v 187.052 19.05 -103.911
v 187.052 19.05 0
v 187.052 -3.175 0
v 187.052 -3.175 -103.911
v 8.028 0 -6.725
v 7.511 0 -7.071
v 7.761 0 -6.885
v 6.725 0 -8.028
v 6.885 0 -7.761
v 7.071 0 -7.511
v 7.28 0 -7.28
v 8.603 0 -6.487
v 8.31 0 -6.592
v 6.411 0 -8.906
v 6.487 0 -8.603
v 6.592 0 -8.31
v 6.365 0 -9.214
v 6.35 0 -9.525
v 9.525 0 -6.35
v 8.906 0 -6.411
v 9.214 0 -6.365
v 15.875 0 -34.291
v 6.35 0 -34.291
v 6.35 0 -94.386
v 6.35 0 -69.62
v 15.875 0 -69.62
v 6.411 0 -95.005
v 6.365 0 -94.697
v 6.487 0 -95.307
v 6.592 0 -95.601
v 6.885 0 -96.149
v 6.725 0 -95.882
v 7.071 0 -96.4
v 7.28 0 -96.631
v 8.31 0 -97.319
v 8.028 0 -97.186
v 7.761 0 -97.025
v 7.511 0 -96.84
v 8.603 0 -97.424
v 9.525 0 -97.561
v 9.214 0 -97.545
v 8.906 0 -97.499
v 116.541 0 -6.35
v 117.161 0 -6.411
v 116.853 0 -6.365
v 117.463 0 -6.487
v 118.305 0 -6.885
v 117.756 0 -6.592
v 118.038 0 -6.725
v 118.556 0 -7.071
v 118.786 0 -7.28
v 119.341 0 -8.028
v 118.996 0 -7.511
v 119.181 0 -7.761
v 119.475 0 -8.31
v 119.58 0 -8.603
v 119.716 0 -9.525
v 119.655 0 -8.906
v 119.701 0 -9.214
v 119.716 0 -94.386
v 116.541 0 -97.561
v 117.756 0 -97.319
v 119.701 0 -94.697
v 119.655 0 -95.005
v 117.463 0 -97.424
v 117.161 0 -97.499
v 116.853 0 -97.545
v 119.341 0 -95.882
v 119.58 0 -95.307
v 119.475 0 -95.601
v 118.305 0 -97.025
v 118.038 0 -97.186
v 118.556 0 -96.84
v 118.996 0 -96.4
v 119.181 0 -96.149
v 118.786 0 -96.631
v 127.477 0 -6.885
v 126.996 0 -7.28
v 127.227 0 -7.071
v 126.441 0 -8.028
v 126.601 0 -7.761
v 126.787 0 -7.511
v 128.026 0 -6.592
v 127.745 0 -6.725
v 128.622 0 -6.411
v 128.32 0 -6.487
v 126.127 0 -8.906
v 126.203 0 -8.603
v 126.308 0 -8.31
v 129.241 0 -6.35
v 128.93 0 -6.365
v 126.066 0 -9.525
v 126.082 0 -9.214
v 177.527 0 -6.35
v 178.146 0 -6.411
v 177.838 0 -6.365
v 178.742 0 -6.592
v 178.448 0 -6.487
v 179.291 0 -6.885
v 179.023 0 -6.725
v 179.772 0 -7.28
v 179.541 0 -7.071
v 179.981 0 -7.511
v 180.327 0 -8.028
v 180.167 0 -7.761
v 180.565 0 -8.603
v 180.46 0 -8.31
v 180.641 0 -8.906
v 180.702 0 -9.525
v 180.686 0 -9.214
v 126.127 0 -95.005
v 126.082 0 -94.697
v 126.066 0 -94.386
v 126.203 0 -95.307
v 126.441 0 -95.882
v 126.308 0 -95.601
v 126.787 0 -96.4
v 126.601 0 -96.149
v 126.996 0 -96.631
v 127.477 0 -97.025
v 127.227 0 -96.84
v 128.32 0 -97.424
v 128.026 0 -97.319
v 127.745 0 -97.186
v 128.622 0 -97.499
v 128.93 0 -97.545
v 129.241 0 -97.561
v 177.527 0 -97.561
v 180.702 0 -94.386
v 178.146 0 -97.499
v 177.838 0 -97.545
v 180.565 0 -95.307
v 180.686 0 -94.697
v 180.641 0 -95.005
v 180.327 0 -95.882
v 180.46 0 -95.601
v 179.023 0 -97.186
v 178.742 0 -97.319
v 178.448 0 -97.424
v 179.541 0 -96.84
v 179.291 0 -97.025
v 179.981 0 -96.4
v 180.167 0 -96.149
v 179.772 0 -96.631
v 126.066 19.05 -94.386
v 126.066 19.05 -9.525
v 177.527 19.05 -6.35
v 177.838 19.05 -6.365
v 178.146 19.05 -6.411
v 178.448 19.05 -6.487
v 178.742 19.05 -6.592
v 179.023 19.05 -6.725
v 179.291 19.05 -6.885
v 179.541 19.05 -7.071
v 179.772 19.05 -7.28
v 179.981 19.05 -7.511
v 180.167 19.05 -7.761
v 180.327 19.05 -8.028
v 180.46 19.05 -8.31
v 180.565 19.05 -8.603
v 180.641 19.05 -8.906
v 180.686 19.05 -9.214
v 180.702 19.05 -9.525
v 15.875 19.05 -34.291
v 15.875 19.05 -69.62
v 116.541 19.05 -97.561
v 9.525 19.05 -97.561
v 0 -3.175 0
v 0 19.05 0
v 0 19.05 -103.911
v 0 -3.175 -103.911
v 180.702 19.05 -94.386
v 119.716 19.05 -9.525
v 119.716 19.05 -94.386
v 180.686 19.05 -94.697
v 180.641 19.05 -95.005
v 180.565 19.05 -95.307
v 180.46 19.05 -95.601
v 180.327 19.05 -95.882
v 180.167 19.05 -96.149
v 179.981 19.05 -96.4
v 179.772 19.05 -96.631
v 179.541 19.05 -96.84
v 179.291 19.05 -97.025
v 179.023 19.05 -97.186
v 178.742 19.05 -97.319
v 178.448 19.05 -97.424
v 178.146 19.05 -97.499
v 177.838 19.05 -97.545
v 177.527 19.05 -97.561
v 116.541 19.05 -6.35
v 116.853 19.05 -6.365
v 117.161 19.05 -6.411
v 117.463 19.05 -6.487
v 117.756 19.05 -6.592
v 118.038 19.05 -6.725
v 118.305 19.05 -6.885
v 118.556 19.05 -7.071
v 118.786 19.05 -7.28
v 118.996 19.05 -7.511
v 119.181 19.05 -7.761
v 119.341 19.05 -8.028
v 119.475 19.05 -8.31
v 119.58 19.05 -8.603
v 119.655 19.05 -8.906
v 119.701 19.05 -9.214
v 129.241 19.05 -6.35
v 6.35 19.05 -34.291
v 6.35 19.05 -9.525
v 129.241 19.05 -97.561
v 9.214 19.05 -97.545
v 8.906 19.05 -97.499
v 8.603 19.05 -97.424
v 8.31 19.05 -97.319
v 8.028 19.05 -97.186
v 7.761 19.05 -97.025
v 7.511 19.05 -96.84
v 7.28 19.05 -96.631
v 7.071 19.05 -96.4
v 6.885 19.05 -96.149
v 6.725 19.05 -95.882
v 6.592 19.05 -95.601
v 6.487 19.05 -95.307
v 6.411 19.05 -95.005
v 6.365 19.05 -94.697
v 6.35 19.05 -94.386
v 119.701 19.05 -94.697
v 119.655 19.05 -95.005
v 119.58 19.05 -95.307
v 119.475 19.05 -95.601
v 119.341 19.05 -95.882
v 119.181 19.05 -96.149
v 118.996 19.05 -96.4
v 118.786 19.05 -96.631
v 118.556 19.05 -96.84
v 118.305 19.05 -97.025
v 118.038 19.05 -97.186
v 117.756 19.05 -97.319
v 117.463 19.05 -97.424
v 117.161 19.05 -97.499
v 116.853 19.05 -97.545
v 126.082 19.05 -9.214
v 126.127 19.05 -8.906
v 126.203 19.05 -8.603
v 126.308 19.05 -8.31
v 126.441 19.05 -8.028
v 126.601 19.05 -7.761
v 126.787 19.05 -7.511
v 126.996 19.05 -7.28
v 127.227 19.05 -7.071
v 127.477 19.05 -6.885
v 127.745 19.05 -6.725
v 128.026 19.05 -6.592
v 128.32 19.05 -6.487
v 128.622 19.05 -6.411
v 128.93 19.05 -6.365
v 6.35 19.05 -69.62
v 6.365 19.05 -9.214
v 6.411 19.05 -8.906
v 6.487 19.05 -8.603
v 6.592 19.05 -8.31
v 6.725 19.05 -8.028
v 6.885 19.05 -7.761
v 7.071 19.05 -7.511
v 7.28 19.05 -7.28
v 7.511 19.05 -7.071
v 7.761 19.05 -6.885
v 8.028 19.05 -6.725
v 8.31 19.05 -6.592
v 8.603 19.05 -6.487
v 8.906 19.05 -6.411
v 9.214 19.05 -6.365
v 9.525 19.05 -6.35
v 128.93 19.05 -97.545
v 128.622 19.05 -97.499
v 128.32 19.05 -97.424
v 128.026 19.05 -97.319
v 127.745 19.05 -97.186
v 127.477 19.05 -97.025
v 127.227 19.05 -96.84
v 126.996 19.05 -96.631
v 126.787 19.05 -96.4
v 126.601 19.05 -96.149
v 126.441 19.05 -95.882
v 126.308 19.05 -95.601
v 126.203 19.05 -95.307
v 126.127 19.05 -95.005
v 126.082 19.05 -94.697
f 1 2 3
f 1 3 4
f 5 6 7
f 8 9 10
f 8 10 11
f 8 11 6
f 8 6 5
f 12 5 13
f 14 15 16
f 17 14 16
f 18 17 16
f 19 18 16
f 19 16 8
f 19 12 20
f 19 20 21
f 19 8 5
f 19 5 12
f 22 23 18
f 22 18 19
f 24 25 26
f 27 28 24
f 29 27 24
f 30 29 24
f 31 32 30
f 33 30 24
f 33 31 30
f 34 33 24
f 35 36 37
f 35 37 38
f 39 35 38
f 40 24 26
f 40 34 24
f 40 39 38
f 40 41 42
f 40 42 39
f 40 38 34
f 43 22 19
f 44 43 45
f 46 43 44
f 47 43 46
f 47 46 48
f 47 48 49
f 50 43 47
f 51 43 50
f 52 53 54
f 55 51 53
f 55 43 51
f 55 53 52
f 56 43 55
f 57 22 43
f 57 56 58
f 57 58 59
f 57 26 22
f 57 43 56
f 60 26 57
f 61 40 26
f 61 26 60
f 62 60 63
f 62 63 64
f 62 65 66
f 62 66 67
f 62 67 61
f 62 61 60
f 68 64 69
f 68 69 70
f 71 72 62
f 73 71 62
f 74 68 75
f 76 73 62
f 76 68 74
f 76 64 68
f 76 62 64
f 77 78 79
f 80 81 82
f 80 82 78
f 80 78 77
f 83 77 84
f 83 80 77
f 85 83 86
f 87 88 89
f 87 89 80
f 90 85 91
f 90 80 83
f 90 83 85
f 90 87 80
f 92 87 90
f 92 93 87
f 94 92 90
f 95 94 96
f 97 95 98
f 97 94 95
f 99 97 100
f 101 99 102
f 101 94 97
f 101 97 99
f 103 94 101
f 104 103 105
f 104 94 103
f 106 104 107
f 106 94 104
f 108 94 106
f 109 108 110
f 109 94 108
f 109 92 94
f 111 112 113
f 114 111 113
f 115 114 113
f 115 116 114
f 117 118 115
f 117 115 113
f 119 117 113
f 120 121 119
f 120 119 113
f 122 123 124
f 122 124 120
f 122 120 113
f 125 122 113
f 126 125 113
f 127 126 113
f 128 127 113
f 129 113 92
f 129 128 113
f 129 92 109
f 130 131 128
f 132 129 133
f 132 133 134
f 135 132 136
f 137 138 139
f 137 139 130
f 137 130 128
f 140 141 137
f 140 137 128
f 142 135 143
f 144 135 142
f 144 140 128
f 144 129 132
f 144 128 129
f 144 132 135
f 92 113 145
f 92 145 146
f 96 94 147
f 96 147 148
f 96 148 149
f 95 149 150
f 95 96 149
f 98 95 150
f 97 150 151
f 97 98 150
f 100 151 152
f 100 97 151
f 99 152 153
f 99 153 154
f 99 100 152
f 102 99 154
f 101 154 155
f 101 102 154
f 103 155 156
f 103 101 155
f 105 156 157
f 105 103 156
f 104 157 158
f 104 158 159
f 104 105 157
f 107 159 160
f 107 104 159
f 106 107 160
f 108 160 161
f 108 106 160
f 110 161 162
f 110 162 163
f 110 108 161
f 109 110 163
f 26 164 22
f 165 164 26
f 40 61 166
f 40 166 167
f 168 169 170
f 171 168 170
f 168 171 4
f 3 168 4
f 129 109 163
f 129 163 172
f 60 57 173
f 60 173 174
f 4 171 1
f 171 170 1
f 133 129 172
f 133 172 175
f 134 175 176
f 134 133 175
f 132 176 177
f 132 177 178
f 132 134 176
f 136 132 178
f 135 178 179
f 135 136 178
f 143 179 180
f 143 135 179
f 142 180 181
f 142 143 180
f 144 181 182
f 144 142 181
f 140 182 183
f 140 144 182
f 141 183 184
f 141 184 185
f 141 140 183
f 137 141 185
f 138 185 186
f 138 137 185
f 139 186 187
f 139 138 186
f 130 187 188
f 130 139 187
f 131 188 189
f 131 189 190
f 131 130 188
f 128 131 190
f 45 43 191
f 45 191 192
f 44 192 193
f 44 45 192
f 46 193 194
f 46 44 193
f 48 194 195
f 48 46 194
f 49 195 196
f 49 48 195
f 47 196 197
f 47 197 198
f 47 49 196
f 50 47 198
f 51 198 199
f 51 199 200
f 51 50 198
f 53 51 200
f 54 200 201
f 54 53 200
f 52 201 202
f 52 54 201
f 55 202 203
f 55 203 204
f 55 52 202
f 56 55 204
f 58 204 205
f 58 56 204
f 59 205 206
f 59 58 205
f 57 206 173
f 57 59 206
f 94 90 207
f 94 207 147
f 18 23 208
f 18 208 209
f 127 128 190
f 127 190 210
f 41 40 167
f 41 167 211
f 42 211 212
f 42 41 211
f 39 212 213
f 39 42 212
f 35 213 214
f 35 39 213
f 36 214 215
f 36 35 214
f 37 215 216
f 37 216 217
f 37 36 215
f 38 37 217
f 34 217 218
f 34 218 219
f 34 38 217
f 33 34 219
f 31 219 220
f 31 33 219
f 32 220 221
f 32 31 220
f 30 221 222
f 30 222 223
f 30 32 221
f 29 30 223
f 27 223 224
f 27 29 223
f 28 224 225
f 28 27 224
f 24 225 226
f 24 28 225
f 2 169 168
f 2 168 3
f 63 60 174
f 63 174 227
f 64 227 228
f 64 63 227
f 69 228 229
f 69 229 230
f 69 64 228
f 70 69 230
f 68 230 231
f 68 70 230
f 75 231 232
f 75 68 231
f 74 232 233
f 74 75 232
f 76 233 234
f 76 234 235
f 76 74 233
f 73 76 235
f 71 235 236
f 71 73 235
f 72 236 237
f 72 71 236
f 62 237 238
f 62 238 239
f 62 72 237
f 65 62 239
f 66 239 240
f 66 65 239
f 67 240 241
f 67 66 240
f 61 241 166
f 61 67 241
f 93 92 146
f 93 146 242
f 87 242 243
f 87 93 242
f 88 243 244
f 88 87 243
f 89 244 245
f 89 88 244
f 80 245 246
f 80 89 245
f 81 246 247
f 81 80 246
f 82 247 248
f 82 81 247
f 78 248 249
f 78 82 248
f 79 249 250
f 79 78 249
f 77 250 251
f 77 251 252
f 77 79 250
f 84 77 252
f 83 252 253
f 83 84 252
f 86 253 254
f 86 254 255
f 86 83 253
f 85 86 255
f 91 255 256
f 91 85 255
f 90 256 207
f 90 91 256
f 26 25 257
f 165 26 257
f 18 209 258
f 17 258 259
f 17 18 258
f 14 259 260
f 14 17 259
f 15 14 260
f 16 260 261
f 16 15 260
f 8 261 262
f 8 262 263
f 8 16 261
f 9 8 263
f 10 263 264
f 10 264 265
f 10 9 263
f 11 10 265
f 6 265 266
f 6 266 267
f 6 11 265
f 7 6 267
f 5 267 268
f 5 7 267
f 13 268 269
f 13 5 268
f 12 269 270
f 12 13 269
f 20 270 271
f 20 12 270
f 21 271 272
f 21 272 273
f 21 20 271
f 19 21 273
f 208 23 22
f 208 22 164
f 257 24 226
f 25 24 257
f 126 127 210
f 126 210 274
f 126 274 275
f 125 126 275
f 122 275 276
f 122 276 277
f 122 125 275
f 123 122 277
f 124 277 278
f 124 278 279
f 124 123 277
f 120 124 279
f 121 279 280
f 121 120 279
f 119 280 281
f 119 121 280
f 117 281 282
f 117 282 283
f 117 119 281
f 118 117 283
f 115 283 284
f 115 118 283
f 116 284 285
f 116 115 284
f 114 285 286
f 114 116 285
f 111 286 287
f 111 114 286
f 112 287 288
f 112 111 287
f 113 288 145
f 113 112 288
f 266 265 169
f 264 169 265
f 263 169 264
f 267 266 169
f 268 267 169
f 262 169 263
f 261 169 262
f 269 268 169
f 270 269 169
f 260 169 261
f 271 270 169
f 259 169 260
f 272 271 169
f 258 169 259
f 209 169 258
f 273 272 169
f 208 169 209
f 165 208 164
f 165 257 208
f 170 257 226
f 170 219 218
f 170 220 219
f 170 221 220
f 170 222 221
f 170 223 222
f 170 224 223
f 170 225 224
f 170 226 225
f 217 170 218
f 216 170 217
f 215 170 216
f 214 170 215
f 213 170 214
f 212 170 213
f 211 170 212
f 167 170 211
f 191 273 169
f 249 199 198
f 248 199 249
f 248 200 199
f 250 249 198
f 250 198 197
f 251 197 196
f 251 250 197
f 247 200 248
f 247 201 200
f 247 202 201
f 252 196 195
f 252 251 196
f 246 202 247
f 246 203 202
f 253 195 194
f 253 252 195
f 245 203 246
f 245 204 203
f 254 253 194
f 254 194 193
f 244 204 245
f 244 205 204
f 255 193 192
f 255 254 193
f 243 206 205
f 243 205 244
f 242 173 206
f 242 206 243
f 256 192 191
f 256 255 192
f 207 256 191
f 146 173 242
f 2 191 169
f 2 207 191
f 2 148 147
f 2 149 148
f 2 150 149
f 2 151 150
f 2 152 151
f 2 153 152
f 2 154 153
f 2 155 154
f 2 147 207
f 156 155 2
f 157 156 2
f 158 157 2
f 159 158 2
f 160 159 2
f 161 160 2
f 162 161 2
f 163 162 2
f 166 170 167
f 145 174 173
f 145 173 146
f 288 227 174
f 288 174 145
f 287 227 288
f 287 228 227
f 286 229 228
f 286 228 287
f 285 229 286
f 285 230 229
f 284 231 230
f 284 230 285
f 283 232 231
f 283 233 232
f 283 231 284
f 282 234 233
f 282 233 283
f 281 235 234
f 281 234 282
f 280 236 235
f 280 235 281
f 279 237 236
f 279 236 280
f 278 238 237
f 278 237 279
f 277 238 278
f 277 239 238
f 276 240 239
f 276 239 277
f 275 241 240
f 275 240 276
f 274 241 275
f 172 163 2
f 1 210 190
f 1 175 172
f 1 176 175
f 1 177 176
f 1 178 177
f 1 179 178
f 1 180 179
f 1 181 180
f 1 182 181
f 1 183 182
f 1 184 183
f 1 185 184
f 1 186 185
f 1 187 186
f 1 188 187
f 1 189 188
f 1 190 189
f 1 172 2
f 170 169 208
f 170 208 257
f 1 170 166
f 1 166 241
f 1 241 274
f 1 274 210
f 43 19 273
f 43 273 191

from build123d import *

# Parameters (mm, degrees)
SKETCH11_W     = 187.05178758
SKETCH11_H     = 103.91050065
EXTRUDE3_DEPTH = 19.05
SKETCH12_W     = 187.05178758
SKETCH12_H     = 103.91050065
EXTRUDE4_DEPTH = 3.175
SKETCH15_W     = 35.329261405
SKETCH15_H     = 19.05
EXTRUDE6_DEPTH = 9.525


with BuildPart() as part:
    # Sketch11 → Extrude3 (new body)
    with BuildSketch(Plane(origin=(0, 0, 0), x_dir=(1, 0, 0), z_dir=(0, 1, 0))):
        with Locations((93.52589379, 51.955250325)):
            Rectangle(SKETCH11_W, SKETCH11_H)
        with BuildLine():
            Line((9.525, 6.35), (116.541319734, 6.35))
            ThreePointArc((116.541319734, 6.35), (118.786383764, 7.27993597), (119.716319734, 9.525))
            Line((119.716319734, 9.525), (119.716319734, 94.38550065))
            ThreePointArc((119.716319734, 94.38550065), (118.786383764, 96.63056468), (116.541319734, 97.56050065))
            Line((116.541319734, 97.56050065), (9.525, 97.56050065))
            ThreePointArc((9.525, 97.56050065), (7.27993597, 96.63056468), (6.35, 94.38550065))
            Line((6.35, 94.38550065), (6.35, 9.525))
            ThreePointArc((6.35, 9.525), (7.27993597, 7.27993597), (9.525, 6.35))
        make_face(mode=Mode.SUBTRACT)
        with BuildLine():
            Line((180.70178758, 9.525), (180.70178758, 94.38550065))
            ThreePointArc((180.70178758, 94.38550065), (179.77185161, 96.63056468), (177.52678758, 97.56050065))
            Line((177.52678758, 97.56050065), (129.241319734, 97.56050065))
            ThreePointArc((129.241319734, 97.56050065), (126.996255703, 96.63056468), (126.066319734, 94.38550065))
            Line((126.066319734, 94.38550065), (126.066319734, 9.525))
            ThreePointArc((126.066319734, 9.525), (126.996255703, 7.27993597), (129.241319734, 6.35))
            Line((129.241319734, 6.35), (177.52678758, 6.35))
            ThreePointArc((177.52678758, 6.35), (179.77185161, 7.27993597), (180.70178758, 9.525))
        make_face(mode=Mode.SUBTRACT)
    extrude(amount=EXTRUDE3_DEPTH)

    # Sketch12 → Extrude4 (add)
    with BuildSketch(Plane(origin=(0, 0, 0), x_dir=(1, 0, 0), z_dir=(0, 1, 0))):
        with Locations((93.52589379, 51.955250325)):
            Rectangle(SKETCH12_W, SKETCH12_H)
    extrude(amount=-EXTRUDE4_DEPTH)

    # Sketch15 → Extrude6 (add)
    with BuildSketch(Plane(origin=(6.35, 0, 0), x_dir=(0, 0, -1), z_dir=(1, 0, 0))):
        with Locations((51.955250324, 9.525)):
            Rectangle(SKETCH15_W, SKETCH15_H)
    extrude(amount=EXTRUDE6_DEPTH)


solid = part.part
